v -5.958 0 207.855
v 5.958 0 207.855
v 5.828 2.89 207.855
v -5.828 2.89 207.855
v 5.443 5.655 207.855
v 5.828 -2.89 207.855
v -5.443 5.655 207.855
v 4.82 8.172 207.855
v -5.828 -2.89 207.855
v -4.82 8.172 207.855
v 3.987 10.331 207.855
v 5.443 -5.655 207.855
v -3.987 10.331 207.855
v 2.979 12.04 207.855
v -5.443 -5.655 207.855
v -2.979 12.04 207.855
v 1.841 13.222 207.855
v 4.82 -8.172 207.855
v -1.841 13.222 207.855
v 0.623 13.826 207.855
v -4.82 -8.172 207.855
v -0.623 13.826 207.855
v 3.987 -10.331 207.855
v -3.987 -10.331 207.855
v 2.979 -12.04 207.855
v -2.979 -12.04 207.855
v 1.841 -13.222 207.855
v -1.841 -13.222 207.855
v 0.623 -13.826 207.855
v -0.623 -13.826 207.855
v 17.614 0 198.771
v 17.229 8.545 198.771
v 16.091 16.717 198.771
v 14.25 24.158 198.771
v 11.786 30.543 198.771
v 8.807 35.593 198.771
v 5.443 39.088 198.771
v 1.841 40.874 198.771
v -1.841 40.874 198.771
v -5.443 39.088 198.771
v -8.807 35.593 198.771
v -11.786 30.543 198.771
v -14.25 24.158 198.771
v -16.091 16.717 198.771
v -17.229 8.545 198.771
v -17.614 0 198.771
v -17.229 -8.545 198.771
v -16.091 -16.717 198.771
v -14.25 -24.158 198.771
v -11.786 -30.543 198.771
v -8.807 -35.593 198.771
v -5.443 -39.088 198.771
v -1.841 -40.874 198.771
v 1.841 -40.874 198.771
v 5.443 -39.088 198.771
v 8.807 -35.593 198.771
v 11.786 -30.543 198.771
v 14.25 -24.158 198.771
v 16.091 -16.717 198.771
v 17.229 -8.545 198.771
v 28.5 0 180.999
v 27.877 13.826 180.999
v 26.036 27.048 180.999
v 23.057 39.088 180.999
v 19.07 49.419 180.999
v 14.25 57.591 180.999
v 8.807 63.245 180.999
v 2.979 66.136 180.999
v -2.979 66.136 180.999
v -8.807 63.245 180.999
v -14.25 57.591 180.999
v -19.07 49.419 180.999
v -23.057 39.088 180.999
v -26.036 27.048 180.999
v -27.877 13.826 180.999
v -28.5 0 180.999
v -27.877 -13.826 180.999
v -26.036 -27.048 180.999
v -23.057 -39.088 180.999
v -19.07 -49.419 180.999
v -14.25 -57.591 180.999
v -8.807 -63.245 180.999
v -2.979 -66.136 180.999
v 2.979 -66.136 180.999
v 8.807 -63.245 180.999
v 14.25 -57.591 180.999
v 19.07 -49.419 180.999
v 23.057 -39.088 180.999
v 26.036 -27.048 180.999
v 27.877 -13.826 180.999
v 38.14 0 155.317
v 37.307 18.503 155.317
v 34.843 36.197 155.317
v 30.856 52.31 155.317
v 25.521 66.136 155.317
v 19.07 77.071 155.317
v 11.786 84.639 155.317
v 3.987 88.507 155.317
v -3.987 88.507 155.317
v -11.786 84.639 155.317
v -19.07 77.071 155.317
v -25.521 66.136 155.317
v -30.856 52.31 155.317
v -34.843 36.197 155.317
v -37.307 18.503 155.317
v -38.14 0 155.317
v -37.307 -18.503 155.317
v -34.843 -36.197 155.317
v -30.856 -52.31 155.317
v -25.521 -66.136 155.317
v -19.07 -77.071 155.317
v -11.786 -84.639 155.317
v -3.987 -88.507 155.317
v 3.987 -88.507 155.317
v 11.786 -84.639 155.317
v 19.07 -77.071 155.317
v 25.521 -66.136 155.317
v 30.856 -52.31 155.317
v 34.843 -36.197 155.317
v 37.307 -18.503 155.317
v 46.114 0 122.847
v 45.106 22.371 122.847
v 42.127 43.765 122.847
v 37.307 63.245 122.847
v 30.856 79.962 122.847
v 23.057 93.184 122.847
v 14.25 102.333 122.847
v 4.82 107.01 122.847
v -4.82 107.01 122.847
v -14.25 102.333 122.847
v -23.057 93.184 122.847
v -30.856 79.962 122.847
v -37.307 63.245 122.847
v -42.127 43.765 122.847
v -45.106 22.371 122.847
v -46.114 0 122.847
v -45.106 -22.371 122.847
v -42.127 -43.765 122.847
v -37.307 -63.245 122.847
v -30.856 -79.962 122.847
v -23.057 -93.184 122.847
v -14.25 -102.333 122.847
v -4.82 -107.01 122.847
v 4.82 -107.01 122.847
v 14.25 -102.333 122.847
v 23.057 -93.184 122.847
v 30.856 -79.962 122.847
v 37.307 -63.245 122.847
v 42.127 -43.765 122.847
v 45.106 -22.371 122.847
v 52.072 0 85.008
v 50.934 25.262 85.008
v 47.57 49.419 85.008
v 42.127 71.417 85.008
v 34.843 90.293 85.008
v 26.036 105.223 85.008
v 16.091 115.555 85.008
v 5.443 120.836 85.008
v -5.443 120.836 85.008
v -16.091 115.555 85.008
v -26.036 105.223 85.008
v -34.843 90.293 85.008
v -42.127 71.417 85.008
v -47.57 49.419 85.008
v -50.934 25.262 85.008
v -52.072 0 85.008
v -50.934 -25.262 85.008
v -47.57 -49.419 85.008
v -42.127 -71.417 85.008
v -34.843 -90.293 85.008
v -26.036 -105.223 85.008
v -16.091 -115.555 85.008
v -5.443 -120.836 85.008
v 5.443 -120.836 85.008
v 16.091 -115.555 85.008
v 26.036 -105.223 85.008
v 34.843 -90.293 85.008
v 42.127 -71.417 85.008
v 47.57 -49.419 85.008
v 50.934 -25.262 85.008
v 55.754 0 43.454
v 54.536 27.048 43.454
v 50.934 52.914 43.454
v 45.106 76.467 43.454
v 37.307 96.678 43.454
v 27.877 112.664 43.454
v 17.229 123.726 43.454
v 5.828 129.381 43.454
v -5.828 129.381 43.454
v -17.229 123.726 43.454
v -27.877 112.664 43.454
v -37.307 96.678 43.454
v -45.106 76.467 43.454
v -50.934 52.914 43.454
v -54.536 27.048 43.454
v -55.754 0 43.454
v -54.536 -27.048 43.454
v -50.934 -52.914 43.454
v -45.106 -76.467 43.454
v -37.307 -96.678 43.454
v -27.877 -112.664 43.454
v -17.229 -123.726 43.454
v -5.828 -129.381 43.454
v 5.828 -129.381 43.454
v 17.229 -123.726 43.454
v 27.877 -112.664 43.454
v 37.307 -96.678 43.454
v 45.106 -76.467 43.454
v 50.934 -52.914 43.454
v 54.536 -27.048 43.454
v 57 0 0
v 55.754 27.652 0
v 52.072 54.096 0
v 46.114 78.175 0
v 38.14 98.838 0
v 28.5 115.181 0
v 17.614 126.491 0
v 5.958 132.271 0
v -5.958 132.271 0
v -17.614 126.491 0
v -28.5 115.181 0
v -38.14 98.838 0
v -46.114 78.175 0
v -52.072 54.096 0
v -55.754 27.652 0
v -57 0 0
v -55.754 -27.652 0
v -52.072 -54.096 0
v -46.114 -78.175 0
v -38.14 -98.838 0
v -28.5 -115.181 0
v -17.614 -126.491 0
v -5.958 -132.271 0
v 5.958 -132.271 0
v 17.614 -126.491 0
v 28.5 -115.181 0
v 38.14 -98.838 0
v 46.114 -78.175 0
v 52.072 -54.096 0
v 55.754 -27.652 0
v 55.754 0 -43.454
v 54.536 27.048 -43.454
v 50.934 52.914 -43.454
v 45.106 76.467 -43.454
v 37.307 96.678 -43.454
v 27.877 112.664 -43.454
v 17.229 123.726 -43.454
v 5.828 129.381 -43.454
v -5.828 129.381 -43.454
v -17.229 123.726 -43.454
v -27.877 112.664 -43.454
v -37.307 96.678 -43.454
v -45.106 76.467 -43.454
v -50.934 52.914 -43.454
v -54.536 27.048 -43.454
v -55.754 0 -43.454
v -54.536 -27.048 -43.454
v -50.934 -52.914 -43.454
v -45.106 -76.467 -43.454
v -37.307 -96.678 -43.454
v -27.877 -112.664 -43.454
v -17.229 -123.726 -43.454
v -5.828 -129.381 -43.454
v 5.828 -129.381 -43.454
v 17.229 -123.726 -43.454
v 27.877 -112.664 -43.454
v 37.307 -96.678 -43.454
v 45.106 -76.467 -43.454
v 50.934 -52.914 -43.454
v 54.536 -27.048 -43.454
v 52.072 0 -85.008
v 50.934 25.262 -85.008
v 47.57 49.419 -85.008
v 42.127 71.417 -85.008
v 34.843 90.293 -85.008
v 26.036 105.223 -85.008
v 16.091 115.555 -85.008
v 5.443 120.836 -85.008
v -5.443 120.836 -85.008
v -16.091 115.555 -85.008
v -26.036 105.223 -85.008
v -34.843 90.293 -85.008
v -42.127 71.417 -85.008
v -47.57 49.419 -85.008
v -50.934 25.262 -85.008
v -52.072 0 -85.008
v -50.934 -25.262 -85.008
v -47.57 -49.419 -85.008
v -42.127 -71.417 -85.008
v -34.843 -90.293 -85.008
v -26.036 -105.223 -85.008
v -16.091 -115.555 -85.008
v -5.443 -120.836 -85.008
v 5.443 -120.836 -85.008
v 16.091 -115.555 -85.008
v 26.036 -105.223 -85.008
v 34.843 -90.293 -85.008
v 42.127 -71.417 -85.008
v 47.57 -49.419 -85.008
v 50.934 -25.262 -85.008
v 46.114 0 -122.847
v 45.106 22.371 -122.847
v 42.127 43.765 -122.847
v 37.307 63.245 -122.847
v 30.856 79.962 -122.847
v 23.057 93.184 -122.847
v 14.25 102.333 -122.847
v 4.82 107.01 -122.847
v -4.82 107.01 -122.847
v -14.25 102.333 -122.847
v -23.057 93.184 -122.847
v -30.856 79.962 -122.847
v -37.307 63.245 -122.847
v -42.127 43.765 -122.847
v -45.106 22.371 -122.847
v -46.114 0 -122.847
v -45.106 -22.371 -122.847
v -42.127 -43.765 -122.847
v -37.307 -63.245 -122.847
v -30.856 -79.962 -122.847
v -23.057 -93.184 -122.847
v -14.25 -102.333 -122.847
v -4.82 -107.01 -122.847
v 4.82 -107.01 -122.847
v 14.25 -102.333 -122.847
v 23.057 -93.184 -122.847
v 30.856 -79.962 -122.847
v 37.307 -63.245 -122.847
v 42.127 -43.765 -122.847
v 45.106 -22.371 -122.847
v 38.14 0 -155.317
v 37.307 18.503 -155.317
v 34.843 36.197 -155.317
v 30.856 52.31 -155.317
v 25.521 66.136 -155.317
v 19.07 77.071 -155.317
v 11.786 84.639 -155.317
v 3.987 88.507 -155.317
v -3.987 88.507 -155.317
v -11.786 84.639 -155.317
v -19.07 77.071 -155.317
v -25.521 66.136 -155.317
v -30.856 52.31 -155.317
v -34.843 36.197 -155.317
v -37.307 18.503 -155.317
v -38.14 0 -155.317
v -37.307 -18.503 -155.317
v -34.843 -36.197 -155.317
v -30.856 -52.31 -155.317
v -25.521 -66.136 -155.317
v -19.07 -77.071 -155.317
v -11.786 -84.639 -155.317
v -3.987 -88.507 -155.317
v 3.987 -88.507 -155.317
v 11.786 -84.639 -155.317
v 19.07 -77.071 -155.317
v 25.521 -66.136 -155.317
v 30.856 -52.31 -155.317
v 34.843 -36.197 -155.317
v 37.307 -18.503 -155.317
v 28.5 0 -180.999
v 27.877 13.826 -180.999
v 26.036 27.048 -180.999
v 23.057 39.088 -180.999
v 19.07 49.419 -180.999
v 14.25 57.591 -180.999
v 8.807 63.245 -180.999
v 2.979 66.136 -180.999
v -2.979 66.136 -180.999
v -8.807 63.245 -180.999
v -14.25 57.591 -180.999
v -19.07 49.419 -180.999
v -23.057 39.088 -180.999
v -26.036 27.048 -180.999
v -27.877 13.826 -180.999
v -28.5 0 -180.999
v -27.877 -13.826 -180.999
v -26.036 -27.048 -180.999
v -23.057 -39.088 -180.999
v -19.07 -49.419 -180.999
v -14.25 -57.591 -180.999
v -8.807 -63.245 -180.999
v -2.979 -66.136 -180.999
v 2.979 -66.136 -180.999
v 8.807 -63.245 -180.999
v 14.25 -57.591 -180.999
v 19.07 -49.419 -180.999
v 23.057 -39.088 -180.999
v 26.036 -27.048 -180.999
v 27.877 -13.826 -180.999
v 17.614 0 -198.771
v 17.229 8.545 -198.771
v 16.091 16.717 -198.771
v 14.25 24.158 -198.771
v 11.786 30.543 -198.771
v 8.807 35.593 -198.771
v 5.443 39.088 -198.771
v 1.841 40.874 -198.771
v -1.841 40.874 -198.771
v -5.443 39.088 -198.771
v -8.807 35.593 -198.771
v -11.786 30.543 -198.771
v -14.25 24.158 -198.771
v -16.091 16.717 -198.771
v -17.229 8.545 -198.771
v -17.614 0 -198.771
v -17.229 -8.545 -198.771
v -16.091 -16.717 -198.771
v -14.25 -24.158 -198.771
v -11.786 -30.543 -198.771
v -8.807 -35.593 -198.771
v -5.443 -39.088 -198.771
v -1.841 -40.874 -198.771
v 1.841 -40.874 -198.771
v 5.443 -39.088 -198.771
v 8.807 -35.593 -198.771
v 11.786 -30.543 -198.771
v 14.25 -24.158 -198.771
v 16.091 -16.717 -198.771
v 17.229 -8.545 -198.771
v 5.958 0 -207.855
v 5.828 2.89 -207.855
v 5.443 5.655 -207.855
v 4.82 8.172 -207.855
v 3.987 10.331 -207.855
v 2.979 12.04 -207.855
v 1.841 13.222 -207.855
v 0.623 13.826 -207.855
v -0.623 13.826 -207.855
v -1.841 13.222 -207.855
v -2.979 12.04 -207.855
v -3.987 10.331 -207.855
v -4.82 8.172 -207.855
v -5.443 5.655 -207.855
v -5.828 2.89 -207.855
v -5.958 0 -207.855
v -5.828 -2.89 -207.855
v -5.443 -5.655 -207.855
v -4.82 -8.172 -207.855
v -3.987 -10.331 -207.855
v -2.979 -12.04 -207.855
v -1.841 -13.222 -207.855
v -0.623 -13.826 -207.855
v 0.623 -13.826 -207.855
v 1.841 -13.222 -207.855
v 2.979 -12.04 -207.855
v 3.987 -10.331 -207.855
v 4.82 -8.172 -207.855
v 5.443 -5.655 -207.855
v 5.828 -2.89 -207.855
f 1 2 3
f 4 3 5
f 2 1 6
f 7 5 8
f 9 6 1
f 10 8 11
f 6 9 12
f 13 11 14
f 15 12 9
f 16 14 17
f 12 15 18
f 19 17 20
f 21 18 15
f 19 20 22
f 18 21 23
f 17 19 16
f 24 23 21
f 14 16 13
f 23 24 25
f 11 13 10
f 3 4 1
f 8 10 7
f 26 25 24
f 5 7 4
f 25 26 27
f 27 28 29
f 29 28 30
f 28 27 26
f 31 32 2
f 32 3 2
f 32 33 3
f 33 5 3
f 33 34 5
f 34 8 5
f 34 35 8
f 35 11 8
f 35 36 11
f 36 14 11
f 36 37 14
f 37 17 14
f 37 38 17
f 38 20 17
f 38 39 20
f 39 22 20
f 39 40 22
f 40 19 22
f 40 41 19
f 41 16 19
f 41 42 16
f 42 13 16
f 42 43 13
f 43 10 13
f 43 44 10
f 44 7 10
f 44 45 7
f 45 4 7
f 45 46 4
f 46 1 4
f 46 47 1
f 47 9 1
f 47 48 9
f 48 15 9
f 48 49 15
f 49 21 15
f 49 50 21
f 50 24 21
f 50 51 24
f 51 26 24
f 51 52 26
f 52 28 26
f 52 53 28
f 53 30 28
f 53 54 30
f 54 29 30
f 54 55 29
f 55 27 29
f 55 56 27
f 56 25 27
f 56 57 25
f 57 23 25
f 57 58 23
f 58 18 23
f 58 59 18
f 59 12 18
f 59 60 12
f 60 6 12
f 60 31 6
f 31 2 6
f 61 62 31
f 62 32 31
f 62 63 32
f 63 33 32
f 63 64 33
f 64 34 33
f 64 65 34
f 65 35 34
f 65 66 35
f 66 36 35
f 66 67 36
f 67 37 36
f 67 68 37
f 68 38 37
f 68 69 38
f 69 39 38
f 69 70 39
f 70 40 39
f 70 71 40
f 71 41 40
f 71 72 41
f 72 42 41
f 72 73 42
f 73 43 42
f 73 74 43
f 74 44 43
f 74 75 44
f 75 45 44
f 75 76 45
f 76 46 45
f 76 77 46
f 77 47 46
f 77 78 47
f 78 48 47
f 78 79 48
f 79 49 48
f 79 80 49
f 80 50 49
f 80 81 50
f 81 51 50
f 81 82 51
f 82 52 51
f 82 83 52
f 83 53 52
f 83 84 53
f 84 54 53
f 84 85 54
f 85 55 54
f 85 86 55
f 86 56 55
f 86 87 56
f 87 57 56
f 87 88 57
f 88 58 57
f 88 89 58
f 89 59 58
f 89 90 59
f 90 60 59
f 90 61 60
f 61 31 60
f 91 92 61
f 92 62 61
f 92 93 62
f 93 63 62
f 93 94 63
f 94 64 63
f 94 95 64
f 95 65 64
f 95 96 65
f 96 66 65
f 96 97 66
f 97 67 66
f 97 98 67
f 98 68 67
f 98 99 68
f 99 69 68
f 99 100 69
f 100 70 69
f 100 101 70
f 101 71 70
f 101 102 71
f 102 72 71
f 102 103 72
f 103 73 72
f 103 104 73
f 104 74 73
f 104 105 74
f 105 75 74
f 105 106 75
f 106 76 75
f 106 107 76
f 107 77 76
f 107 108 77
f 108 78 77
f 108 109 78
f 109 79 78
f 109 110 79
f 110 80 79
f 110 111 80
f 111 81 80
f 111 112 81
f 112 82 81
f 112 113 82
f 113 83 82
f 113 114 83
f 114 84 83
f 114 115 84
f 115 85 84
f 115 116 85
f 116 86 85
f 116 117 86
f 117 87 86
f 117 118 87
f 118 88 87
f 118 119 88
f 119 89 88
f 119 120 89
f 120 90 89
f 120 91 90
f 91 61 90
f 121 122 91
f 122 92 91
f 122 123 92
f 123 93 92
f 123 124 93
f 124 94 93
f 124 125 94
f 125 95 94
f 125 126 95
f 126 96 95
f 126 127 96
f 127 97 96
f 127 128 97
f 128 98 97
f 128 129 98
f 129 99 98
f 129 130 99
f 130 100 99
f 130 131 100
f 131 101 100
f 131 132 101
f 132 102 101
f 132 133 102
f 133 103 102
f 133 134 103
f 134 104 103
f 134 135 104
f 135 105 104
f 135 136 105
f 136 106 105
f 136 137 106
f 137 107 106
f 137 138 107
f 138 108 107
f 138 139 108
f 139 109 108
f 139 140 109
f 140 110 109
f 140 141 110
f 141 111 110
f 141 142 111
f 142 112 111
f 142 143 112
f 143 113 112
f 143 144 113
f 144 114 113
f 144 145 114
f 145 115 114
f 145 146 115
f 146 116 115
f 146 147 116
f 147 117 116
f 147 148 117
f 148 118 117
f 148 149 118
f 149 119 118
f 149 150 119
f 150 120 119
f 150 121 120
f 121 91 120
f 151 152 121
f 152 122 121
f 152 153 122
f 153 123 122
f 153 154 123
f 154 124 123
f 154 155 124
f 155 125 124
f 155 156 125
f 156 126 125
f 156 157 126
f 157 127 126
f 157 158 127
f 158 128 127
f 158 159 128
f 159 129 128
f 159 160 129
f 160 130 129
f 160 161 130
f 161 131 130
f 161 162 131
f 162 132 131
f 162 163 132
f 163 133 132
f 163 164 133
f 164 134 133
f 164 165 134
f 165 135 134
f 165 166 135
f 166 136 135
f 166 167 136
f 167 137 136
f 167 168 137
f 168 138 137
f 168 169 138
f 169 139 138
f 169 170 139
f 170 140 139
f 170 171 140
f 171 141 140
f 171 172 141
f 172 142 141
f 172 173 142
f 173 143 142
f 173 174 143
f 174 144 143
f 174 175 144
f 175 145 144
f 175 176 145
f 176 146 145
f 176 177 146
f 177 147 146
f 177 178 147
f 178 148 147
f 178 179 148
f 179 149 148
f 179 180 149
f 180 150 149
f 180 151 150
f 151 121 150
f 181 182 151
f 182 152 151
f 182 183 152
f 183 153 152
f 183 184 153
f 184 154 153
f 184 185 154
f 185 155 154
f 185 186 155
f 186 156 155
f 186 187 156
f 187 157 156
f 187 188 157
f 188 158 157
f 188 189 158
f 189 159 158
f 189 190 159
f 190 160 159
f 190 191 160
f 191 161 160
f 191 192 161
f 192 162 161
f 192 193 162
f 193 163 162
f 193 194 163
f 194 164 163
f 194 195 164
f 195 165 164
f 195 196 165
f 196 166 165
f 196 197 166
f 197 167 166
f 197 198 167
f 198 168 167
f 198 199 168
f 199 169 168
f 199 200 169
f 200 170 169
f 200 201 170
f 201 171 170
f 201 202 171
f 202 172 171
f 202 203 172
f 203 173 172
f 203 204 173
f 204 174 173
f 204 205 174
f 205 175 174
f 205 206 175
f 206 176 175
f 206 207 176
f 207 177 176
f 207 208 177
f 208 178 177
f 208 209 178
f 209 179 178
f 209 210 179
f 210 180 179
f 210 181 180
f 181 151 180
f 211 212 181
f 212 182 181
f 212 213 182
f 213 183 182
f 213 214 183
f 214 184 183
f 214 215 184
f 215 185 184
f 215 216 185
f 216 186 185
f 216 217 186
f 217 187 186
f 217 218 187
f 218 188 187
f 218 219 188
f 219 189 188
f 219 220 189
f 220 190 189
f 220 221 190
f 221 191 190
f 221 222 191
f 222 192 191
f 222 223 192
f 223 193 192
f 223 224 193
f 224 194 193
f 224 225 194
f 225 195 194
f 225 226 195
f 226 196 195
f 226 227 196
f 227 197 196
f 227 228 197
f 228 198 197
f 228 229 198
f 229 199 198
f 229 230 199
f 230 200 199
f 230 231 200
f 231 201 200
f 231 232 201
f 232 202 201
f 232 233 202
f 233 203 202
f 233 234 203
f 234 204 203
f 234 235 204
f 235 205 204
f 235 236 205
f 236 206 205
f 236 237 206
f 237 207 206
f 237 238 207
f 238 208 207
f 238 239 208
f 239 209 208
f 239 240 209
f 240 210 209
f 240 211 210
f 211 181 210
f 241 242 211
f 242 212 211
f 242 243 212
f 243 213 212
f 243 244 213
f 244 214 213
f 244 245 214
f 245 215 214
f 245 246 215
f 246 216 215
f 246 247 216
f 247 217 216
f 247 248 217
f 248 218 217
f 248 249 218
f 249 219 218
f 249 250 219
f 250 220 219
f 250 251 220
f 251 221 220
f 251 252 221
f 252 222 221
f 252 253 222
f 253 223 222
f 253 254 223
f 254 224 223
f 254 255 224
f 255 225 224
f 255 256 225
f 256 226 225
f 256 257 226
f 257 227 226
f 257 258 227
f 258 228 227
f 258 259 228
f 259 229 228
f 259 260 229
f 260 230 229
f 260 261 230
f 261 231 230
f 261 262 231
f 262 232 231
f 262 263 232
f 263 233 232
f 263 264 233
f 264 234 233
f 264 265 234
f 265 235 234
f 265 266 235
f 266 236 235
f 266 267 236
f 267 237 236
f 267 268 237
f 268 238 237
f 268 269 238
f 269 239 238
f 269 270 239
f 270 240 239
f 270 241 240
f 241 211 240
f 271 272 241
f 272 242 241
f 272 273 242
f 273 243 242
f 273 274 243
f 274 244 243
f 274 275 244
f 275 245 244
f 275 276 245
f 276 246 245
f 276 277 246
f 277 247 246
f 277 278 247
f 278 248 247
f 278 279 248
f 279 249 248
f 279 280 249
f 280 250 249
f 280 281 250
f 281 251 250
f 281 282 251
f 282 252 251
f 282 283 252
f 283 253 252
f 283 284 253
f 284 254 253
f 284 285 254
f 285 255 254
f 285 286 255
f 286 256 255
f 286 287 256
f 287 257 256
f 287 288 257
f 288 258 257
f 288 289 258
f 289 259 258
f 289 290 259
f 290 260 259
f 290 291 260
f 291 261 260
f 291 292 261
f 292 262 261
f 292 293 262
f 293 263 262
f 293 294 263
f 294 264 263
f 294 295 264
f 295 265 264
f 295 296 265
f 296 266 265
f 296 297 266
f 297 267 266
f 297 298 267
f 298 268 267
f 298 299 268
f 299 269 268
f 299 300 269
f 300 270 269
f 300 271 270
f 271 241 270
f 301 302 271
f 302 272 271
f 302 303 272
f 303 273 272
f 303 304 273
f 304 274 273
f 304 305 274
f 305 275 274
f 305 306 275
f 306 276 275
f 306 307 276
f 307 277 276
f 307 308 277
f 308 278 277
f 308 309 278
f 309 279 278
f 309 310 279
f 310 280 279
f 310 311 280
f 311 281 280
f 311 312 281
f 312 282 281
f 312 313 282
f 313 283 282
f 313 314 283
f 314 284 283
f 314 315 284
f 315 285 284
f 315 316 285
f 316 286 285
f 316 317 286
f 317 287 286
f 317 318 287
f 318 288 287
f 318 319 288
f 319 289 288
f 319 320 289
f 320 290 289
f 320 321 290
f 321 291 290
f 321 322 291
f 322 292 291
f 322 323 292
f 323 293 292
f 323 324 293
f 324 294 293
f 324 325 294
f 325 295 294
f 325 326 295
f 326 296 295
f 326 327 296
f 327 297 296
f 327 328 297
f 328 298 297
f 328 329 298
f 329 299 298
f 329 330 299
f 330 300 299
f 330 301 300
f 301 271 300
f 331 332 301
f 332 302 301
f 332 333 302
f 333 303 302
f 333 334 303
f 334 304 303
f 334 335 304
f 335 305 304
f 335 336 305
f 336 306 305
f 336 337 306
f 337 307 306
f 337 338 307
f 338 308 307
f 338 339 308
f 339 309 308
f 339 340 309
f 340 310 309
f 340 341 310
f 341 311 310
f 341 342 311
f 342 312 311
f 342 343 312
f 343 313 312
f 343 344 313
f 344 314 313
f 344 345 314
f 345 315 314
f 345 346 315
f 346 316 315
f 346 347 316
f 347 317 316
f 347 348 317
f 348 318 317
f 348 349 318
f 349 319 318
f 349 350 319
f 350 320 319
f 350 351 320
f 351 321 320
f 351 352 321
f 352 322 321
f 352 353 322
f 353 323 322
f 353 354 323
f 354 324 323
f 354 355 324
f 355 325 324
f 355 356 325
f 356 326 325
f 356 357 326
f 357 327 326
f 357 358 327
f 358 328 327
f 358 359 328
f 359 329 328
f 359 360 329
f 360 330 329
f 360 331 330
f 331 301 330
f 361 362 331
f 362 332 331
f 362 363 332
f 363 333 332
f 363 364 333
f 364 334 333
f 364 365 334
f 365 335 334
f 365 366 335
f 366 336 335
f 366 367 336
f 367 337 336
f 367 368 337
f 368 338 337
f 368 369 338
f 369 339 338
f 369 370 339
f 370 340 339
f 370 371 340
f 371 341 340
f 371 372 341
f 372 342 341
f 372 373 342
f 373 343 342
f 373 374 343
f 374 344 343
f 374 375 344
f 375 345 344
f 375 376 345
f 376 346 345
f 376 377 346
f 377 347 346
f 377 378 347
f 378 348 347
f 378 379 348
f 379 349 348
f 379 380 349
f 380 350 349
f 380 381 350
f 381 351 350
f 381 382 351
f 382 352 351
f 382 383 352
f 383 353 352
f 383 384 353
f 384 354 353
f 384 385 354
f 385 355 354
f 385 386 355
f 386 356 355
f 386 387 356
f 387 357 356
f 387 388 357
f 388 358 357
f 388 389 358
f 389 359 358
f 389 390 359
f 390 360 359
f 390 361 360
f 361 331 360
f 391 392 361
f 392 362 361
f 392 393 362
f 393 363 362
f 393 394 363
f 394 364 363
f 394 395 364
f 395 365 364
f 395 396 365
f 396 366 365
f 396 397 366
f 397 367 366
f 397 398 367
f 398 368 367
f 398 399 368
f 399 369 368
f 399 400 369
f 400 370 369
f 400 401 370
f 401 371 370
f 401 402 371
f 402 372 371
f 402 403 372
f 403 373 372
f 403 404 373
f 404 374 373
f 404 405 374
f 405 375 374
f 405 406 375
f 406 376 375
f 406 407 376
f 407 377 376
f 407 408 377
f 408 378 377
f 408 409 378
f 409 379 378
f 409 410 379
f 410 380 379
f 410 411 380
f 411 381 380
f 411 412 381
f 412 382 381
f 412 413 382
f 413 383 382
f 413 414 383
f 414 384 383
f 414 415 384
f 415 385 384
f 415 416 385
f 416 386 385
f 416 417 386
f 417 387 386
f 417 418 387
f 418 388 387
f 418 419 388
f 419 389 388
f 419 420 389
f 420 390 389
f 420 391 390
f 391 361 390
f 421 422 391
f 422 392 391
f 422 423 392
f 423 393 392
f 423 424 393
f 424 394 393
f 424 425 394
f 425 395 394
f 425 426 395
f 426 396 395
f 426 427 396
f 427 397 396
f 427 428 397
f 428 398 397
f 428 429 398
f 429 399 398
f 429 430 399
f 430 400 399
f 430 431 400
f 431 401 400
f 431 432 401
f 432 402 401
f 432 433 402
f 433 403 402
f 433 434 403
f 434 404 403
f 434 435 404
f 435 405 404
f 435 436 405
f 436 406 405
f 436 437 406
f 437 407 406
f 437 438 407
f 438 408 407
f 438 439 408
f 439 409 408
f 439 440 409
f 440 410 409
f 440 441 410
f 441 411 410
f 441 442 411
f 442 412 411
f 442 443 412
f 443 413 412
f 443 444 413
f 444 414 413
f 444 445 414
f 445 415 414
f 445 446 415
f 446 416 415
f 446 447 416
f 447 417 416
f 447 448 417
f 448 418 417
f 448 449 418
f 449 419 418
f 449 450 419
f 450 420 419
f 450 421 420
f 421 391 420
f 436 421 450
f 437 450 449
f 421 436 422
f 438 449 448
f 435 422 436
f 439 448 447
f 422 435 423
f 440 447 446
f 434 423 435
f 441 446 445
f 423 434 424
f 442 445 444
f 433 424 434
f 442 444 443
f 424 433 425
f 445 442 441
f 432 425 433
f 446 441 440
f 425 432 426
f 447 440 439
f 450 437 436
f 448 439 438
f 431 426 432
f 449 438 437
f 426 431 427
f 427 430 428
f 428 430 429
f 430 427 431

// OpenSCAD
// Generated by SolidPython 1.0.1 on 2020-07-29 00:46:45


scale(v = [3, 7, 11]) {
	sphere(r = 19);
}
/***********************************************
*********      SolidPython code:      **********
************************************************
 
# import packages: SolidPython
from solid import *
from solid.utils import *
from itertools import chain, combinations, permutations


class Resize:

    def __init__(self, scad_file):
        self.scad_file = scad_file
        #self.scad_file = import_scad(scad_file)
        # cone/cylinder param:
        self.r1 = 0
        self.r2 = 0
        self.h = 0
        # rectangular prism param:
        self.w = 0
        self.l = 0
        # ellipse param:
        self.r = 0

    # import OpenScad code (file name corresponds to shape)


    # classify shape + parameters
    def assign(self, param1, param2, param3):
        if self.scad_file == 'cone.scad':
            self.r1 = param1
            self.r2 = param2
            self.h = param3
        elif self.scad_file == 'cylinder.scad':
            self.r1 = param1
            self.r2 = param2
            self.h = param3
        elif self.scad_file == 'rectangularPrism.scad':
            self.h = param1
            self.l = param2
            self.w = param3
        else:
            self.r = param1
            self.h = param2

    # resize parameters
    def iterate(self):
        x = range(3, 20, 2)
        i = 1
        if self.scad_file == 'cone.scad':
            tempList = list(permutations(x, 2))
            for temp in tempList:
                param1 = temp[0]
                param2 = temp[1]
                filepath = 'produced_scad_files/' + 'cone' + str(param1) + '_' + str(param2) + '_' + '.scad'
                scad_render_to_file(cylinder(h=param1, r1=param2, r2=0), filepath)

        elif self.scad_file == 'cylinder.scad':
            tempList = list(permutations(x, 3))
            for temp in tempList:
                param1 = temp[0]
                param2 = temp[1]
                filepath = 'produced_scad_files/' + 'cylinder' + str(param1) + '_' + str(param2) + '_' + '.scad'
                scad_render_to_file(cylinder(h=param1, r1=param2, r2=param2), filepath)

        elif self.scad_file == 'rectangularPrism.scad':
            tempList = list(permutations(x, 3))
            for temp in tempList:
                param1 = temp[0]
                param2 = temp[1]
                param3 = temp[2]
                filepath = 'produced_scad_files/' + 'rectangularPrism' + str(param1) + '_' + str(param2) + '_' + str(
                    param3) + '.scad'
                scad_render_to_file(cube(size=(param1, param2, param3)), filepath)

        elif self.scad_file == 'ellipse.scad':
            tempList = list(permutations(x, 4))
            for temp in tempList:
                param1 = temp[0]
                param2 = temp[1]
                param3 = temp[2]
                param4 = temp[3]
                filepath = 'produced_scad_files/' + 'ellipse' + str(param1) + '_' + str(param2) + '_' + str(param3) + '_' + str(param4) + '.scad'
                scad_render_to_file(scale([param1, param2, param3])(sphere(r=param4)), filepath)

    def render_to_scadfile(self):
        scad_render_to_file(scad, 'example.scad') 
 
************************************************/
